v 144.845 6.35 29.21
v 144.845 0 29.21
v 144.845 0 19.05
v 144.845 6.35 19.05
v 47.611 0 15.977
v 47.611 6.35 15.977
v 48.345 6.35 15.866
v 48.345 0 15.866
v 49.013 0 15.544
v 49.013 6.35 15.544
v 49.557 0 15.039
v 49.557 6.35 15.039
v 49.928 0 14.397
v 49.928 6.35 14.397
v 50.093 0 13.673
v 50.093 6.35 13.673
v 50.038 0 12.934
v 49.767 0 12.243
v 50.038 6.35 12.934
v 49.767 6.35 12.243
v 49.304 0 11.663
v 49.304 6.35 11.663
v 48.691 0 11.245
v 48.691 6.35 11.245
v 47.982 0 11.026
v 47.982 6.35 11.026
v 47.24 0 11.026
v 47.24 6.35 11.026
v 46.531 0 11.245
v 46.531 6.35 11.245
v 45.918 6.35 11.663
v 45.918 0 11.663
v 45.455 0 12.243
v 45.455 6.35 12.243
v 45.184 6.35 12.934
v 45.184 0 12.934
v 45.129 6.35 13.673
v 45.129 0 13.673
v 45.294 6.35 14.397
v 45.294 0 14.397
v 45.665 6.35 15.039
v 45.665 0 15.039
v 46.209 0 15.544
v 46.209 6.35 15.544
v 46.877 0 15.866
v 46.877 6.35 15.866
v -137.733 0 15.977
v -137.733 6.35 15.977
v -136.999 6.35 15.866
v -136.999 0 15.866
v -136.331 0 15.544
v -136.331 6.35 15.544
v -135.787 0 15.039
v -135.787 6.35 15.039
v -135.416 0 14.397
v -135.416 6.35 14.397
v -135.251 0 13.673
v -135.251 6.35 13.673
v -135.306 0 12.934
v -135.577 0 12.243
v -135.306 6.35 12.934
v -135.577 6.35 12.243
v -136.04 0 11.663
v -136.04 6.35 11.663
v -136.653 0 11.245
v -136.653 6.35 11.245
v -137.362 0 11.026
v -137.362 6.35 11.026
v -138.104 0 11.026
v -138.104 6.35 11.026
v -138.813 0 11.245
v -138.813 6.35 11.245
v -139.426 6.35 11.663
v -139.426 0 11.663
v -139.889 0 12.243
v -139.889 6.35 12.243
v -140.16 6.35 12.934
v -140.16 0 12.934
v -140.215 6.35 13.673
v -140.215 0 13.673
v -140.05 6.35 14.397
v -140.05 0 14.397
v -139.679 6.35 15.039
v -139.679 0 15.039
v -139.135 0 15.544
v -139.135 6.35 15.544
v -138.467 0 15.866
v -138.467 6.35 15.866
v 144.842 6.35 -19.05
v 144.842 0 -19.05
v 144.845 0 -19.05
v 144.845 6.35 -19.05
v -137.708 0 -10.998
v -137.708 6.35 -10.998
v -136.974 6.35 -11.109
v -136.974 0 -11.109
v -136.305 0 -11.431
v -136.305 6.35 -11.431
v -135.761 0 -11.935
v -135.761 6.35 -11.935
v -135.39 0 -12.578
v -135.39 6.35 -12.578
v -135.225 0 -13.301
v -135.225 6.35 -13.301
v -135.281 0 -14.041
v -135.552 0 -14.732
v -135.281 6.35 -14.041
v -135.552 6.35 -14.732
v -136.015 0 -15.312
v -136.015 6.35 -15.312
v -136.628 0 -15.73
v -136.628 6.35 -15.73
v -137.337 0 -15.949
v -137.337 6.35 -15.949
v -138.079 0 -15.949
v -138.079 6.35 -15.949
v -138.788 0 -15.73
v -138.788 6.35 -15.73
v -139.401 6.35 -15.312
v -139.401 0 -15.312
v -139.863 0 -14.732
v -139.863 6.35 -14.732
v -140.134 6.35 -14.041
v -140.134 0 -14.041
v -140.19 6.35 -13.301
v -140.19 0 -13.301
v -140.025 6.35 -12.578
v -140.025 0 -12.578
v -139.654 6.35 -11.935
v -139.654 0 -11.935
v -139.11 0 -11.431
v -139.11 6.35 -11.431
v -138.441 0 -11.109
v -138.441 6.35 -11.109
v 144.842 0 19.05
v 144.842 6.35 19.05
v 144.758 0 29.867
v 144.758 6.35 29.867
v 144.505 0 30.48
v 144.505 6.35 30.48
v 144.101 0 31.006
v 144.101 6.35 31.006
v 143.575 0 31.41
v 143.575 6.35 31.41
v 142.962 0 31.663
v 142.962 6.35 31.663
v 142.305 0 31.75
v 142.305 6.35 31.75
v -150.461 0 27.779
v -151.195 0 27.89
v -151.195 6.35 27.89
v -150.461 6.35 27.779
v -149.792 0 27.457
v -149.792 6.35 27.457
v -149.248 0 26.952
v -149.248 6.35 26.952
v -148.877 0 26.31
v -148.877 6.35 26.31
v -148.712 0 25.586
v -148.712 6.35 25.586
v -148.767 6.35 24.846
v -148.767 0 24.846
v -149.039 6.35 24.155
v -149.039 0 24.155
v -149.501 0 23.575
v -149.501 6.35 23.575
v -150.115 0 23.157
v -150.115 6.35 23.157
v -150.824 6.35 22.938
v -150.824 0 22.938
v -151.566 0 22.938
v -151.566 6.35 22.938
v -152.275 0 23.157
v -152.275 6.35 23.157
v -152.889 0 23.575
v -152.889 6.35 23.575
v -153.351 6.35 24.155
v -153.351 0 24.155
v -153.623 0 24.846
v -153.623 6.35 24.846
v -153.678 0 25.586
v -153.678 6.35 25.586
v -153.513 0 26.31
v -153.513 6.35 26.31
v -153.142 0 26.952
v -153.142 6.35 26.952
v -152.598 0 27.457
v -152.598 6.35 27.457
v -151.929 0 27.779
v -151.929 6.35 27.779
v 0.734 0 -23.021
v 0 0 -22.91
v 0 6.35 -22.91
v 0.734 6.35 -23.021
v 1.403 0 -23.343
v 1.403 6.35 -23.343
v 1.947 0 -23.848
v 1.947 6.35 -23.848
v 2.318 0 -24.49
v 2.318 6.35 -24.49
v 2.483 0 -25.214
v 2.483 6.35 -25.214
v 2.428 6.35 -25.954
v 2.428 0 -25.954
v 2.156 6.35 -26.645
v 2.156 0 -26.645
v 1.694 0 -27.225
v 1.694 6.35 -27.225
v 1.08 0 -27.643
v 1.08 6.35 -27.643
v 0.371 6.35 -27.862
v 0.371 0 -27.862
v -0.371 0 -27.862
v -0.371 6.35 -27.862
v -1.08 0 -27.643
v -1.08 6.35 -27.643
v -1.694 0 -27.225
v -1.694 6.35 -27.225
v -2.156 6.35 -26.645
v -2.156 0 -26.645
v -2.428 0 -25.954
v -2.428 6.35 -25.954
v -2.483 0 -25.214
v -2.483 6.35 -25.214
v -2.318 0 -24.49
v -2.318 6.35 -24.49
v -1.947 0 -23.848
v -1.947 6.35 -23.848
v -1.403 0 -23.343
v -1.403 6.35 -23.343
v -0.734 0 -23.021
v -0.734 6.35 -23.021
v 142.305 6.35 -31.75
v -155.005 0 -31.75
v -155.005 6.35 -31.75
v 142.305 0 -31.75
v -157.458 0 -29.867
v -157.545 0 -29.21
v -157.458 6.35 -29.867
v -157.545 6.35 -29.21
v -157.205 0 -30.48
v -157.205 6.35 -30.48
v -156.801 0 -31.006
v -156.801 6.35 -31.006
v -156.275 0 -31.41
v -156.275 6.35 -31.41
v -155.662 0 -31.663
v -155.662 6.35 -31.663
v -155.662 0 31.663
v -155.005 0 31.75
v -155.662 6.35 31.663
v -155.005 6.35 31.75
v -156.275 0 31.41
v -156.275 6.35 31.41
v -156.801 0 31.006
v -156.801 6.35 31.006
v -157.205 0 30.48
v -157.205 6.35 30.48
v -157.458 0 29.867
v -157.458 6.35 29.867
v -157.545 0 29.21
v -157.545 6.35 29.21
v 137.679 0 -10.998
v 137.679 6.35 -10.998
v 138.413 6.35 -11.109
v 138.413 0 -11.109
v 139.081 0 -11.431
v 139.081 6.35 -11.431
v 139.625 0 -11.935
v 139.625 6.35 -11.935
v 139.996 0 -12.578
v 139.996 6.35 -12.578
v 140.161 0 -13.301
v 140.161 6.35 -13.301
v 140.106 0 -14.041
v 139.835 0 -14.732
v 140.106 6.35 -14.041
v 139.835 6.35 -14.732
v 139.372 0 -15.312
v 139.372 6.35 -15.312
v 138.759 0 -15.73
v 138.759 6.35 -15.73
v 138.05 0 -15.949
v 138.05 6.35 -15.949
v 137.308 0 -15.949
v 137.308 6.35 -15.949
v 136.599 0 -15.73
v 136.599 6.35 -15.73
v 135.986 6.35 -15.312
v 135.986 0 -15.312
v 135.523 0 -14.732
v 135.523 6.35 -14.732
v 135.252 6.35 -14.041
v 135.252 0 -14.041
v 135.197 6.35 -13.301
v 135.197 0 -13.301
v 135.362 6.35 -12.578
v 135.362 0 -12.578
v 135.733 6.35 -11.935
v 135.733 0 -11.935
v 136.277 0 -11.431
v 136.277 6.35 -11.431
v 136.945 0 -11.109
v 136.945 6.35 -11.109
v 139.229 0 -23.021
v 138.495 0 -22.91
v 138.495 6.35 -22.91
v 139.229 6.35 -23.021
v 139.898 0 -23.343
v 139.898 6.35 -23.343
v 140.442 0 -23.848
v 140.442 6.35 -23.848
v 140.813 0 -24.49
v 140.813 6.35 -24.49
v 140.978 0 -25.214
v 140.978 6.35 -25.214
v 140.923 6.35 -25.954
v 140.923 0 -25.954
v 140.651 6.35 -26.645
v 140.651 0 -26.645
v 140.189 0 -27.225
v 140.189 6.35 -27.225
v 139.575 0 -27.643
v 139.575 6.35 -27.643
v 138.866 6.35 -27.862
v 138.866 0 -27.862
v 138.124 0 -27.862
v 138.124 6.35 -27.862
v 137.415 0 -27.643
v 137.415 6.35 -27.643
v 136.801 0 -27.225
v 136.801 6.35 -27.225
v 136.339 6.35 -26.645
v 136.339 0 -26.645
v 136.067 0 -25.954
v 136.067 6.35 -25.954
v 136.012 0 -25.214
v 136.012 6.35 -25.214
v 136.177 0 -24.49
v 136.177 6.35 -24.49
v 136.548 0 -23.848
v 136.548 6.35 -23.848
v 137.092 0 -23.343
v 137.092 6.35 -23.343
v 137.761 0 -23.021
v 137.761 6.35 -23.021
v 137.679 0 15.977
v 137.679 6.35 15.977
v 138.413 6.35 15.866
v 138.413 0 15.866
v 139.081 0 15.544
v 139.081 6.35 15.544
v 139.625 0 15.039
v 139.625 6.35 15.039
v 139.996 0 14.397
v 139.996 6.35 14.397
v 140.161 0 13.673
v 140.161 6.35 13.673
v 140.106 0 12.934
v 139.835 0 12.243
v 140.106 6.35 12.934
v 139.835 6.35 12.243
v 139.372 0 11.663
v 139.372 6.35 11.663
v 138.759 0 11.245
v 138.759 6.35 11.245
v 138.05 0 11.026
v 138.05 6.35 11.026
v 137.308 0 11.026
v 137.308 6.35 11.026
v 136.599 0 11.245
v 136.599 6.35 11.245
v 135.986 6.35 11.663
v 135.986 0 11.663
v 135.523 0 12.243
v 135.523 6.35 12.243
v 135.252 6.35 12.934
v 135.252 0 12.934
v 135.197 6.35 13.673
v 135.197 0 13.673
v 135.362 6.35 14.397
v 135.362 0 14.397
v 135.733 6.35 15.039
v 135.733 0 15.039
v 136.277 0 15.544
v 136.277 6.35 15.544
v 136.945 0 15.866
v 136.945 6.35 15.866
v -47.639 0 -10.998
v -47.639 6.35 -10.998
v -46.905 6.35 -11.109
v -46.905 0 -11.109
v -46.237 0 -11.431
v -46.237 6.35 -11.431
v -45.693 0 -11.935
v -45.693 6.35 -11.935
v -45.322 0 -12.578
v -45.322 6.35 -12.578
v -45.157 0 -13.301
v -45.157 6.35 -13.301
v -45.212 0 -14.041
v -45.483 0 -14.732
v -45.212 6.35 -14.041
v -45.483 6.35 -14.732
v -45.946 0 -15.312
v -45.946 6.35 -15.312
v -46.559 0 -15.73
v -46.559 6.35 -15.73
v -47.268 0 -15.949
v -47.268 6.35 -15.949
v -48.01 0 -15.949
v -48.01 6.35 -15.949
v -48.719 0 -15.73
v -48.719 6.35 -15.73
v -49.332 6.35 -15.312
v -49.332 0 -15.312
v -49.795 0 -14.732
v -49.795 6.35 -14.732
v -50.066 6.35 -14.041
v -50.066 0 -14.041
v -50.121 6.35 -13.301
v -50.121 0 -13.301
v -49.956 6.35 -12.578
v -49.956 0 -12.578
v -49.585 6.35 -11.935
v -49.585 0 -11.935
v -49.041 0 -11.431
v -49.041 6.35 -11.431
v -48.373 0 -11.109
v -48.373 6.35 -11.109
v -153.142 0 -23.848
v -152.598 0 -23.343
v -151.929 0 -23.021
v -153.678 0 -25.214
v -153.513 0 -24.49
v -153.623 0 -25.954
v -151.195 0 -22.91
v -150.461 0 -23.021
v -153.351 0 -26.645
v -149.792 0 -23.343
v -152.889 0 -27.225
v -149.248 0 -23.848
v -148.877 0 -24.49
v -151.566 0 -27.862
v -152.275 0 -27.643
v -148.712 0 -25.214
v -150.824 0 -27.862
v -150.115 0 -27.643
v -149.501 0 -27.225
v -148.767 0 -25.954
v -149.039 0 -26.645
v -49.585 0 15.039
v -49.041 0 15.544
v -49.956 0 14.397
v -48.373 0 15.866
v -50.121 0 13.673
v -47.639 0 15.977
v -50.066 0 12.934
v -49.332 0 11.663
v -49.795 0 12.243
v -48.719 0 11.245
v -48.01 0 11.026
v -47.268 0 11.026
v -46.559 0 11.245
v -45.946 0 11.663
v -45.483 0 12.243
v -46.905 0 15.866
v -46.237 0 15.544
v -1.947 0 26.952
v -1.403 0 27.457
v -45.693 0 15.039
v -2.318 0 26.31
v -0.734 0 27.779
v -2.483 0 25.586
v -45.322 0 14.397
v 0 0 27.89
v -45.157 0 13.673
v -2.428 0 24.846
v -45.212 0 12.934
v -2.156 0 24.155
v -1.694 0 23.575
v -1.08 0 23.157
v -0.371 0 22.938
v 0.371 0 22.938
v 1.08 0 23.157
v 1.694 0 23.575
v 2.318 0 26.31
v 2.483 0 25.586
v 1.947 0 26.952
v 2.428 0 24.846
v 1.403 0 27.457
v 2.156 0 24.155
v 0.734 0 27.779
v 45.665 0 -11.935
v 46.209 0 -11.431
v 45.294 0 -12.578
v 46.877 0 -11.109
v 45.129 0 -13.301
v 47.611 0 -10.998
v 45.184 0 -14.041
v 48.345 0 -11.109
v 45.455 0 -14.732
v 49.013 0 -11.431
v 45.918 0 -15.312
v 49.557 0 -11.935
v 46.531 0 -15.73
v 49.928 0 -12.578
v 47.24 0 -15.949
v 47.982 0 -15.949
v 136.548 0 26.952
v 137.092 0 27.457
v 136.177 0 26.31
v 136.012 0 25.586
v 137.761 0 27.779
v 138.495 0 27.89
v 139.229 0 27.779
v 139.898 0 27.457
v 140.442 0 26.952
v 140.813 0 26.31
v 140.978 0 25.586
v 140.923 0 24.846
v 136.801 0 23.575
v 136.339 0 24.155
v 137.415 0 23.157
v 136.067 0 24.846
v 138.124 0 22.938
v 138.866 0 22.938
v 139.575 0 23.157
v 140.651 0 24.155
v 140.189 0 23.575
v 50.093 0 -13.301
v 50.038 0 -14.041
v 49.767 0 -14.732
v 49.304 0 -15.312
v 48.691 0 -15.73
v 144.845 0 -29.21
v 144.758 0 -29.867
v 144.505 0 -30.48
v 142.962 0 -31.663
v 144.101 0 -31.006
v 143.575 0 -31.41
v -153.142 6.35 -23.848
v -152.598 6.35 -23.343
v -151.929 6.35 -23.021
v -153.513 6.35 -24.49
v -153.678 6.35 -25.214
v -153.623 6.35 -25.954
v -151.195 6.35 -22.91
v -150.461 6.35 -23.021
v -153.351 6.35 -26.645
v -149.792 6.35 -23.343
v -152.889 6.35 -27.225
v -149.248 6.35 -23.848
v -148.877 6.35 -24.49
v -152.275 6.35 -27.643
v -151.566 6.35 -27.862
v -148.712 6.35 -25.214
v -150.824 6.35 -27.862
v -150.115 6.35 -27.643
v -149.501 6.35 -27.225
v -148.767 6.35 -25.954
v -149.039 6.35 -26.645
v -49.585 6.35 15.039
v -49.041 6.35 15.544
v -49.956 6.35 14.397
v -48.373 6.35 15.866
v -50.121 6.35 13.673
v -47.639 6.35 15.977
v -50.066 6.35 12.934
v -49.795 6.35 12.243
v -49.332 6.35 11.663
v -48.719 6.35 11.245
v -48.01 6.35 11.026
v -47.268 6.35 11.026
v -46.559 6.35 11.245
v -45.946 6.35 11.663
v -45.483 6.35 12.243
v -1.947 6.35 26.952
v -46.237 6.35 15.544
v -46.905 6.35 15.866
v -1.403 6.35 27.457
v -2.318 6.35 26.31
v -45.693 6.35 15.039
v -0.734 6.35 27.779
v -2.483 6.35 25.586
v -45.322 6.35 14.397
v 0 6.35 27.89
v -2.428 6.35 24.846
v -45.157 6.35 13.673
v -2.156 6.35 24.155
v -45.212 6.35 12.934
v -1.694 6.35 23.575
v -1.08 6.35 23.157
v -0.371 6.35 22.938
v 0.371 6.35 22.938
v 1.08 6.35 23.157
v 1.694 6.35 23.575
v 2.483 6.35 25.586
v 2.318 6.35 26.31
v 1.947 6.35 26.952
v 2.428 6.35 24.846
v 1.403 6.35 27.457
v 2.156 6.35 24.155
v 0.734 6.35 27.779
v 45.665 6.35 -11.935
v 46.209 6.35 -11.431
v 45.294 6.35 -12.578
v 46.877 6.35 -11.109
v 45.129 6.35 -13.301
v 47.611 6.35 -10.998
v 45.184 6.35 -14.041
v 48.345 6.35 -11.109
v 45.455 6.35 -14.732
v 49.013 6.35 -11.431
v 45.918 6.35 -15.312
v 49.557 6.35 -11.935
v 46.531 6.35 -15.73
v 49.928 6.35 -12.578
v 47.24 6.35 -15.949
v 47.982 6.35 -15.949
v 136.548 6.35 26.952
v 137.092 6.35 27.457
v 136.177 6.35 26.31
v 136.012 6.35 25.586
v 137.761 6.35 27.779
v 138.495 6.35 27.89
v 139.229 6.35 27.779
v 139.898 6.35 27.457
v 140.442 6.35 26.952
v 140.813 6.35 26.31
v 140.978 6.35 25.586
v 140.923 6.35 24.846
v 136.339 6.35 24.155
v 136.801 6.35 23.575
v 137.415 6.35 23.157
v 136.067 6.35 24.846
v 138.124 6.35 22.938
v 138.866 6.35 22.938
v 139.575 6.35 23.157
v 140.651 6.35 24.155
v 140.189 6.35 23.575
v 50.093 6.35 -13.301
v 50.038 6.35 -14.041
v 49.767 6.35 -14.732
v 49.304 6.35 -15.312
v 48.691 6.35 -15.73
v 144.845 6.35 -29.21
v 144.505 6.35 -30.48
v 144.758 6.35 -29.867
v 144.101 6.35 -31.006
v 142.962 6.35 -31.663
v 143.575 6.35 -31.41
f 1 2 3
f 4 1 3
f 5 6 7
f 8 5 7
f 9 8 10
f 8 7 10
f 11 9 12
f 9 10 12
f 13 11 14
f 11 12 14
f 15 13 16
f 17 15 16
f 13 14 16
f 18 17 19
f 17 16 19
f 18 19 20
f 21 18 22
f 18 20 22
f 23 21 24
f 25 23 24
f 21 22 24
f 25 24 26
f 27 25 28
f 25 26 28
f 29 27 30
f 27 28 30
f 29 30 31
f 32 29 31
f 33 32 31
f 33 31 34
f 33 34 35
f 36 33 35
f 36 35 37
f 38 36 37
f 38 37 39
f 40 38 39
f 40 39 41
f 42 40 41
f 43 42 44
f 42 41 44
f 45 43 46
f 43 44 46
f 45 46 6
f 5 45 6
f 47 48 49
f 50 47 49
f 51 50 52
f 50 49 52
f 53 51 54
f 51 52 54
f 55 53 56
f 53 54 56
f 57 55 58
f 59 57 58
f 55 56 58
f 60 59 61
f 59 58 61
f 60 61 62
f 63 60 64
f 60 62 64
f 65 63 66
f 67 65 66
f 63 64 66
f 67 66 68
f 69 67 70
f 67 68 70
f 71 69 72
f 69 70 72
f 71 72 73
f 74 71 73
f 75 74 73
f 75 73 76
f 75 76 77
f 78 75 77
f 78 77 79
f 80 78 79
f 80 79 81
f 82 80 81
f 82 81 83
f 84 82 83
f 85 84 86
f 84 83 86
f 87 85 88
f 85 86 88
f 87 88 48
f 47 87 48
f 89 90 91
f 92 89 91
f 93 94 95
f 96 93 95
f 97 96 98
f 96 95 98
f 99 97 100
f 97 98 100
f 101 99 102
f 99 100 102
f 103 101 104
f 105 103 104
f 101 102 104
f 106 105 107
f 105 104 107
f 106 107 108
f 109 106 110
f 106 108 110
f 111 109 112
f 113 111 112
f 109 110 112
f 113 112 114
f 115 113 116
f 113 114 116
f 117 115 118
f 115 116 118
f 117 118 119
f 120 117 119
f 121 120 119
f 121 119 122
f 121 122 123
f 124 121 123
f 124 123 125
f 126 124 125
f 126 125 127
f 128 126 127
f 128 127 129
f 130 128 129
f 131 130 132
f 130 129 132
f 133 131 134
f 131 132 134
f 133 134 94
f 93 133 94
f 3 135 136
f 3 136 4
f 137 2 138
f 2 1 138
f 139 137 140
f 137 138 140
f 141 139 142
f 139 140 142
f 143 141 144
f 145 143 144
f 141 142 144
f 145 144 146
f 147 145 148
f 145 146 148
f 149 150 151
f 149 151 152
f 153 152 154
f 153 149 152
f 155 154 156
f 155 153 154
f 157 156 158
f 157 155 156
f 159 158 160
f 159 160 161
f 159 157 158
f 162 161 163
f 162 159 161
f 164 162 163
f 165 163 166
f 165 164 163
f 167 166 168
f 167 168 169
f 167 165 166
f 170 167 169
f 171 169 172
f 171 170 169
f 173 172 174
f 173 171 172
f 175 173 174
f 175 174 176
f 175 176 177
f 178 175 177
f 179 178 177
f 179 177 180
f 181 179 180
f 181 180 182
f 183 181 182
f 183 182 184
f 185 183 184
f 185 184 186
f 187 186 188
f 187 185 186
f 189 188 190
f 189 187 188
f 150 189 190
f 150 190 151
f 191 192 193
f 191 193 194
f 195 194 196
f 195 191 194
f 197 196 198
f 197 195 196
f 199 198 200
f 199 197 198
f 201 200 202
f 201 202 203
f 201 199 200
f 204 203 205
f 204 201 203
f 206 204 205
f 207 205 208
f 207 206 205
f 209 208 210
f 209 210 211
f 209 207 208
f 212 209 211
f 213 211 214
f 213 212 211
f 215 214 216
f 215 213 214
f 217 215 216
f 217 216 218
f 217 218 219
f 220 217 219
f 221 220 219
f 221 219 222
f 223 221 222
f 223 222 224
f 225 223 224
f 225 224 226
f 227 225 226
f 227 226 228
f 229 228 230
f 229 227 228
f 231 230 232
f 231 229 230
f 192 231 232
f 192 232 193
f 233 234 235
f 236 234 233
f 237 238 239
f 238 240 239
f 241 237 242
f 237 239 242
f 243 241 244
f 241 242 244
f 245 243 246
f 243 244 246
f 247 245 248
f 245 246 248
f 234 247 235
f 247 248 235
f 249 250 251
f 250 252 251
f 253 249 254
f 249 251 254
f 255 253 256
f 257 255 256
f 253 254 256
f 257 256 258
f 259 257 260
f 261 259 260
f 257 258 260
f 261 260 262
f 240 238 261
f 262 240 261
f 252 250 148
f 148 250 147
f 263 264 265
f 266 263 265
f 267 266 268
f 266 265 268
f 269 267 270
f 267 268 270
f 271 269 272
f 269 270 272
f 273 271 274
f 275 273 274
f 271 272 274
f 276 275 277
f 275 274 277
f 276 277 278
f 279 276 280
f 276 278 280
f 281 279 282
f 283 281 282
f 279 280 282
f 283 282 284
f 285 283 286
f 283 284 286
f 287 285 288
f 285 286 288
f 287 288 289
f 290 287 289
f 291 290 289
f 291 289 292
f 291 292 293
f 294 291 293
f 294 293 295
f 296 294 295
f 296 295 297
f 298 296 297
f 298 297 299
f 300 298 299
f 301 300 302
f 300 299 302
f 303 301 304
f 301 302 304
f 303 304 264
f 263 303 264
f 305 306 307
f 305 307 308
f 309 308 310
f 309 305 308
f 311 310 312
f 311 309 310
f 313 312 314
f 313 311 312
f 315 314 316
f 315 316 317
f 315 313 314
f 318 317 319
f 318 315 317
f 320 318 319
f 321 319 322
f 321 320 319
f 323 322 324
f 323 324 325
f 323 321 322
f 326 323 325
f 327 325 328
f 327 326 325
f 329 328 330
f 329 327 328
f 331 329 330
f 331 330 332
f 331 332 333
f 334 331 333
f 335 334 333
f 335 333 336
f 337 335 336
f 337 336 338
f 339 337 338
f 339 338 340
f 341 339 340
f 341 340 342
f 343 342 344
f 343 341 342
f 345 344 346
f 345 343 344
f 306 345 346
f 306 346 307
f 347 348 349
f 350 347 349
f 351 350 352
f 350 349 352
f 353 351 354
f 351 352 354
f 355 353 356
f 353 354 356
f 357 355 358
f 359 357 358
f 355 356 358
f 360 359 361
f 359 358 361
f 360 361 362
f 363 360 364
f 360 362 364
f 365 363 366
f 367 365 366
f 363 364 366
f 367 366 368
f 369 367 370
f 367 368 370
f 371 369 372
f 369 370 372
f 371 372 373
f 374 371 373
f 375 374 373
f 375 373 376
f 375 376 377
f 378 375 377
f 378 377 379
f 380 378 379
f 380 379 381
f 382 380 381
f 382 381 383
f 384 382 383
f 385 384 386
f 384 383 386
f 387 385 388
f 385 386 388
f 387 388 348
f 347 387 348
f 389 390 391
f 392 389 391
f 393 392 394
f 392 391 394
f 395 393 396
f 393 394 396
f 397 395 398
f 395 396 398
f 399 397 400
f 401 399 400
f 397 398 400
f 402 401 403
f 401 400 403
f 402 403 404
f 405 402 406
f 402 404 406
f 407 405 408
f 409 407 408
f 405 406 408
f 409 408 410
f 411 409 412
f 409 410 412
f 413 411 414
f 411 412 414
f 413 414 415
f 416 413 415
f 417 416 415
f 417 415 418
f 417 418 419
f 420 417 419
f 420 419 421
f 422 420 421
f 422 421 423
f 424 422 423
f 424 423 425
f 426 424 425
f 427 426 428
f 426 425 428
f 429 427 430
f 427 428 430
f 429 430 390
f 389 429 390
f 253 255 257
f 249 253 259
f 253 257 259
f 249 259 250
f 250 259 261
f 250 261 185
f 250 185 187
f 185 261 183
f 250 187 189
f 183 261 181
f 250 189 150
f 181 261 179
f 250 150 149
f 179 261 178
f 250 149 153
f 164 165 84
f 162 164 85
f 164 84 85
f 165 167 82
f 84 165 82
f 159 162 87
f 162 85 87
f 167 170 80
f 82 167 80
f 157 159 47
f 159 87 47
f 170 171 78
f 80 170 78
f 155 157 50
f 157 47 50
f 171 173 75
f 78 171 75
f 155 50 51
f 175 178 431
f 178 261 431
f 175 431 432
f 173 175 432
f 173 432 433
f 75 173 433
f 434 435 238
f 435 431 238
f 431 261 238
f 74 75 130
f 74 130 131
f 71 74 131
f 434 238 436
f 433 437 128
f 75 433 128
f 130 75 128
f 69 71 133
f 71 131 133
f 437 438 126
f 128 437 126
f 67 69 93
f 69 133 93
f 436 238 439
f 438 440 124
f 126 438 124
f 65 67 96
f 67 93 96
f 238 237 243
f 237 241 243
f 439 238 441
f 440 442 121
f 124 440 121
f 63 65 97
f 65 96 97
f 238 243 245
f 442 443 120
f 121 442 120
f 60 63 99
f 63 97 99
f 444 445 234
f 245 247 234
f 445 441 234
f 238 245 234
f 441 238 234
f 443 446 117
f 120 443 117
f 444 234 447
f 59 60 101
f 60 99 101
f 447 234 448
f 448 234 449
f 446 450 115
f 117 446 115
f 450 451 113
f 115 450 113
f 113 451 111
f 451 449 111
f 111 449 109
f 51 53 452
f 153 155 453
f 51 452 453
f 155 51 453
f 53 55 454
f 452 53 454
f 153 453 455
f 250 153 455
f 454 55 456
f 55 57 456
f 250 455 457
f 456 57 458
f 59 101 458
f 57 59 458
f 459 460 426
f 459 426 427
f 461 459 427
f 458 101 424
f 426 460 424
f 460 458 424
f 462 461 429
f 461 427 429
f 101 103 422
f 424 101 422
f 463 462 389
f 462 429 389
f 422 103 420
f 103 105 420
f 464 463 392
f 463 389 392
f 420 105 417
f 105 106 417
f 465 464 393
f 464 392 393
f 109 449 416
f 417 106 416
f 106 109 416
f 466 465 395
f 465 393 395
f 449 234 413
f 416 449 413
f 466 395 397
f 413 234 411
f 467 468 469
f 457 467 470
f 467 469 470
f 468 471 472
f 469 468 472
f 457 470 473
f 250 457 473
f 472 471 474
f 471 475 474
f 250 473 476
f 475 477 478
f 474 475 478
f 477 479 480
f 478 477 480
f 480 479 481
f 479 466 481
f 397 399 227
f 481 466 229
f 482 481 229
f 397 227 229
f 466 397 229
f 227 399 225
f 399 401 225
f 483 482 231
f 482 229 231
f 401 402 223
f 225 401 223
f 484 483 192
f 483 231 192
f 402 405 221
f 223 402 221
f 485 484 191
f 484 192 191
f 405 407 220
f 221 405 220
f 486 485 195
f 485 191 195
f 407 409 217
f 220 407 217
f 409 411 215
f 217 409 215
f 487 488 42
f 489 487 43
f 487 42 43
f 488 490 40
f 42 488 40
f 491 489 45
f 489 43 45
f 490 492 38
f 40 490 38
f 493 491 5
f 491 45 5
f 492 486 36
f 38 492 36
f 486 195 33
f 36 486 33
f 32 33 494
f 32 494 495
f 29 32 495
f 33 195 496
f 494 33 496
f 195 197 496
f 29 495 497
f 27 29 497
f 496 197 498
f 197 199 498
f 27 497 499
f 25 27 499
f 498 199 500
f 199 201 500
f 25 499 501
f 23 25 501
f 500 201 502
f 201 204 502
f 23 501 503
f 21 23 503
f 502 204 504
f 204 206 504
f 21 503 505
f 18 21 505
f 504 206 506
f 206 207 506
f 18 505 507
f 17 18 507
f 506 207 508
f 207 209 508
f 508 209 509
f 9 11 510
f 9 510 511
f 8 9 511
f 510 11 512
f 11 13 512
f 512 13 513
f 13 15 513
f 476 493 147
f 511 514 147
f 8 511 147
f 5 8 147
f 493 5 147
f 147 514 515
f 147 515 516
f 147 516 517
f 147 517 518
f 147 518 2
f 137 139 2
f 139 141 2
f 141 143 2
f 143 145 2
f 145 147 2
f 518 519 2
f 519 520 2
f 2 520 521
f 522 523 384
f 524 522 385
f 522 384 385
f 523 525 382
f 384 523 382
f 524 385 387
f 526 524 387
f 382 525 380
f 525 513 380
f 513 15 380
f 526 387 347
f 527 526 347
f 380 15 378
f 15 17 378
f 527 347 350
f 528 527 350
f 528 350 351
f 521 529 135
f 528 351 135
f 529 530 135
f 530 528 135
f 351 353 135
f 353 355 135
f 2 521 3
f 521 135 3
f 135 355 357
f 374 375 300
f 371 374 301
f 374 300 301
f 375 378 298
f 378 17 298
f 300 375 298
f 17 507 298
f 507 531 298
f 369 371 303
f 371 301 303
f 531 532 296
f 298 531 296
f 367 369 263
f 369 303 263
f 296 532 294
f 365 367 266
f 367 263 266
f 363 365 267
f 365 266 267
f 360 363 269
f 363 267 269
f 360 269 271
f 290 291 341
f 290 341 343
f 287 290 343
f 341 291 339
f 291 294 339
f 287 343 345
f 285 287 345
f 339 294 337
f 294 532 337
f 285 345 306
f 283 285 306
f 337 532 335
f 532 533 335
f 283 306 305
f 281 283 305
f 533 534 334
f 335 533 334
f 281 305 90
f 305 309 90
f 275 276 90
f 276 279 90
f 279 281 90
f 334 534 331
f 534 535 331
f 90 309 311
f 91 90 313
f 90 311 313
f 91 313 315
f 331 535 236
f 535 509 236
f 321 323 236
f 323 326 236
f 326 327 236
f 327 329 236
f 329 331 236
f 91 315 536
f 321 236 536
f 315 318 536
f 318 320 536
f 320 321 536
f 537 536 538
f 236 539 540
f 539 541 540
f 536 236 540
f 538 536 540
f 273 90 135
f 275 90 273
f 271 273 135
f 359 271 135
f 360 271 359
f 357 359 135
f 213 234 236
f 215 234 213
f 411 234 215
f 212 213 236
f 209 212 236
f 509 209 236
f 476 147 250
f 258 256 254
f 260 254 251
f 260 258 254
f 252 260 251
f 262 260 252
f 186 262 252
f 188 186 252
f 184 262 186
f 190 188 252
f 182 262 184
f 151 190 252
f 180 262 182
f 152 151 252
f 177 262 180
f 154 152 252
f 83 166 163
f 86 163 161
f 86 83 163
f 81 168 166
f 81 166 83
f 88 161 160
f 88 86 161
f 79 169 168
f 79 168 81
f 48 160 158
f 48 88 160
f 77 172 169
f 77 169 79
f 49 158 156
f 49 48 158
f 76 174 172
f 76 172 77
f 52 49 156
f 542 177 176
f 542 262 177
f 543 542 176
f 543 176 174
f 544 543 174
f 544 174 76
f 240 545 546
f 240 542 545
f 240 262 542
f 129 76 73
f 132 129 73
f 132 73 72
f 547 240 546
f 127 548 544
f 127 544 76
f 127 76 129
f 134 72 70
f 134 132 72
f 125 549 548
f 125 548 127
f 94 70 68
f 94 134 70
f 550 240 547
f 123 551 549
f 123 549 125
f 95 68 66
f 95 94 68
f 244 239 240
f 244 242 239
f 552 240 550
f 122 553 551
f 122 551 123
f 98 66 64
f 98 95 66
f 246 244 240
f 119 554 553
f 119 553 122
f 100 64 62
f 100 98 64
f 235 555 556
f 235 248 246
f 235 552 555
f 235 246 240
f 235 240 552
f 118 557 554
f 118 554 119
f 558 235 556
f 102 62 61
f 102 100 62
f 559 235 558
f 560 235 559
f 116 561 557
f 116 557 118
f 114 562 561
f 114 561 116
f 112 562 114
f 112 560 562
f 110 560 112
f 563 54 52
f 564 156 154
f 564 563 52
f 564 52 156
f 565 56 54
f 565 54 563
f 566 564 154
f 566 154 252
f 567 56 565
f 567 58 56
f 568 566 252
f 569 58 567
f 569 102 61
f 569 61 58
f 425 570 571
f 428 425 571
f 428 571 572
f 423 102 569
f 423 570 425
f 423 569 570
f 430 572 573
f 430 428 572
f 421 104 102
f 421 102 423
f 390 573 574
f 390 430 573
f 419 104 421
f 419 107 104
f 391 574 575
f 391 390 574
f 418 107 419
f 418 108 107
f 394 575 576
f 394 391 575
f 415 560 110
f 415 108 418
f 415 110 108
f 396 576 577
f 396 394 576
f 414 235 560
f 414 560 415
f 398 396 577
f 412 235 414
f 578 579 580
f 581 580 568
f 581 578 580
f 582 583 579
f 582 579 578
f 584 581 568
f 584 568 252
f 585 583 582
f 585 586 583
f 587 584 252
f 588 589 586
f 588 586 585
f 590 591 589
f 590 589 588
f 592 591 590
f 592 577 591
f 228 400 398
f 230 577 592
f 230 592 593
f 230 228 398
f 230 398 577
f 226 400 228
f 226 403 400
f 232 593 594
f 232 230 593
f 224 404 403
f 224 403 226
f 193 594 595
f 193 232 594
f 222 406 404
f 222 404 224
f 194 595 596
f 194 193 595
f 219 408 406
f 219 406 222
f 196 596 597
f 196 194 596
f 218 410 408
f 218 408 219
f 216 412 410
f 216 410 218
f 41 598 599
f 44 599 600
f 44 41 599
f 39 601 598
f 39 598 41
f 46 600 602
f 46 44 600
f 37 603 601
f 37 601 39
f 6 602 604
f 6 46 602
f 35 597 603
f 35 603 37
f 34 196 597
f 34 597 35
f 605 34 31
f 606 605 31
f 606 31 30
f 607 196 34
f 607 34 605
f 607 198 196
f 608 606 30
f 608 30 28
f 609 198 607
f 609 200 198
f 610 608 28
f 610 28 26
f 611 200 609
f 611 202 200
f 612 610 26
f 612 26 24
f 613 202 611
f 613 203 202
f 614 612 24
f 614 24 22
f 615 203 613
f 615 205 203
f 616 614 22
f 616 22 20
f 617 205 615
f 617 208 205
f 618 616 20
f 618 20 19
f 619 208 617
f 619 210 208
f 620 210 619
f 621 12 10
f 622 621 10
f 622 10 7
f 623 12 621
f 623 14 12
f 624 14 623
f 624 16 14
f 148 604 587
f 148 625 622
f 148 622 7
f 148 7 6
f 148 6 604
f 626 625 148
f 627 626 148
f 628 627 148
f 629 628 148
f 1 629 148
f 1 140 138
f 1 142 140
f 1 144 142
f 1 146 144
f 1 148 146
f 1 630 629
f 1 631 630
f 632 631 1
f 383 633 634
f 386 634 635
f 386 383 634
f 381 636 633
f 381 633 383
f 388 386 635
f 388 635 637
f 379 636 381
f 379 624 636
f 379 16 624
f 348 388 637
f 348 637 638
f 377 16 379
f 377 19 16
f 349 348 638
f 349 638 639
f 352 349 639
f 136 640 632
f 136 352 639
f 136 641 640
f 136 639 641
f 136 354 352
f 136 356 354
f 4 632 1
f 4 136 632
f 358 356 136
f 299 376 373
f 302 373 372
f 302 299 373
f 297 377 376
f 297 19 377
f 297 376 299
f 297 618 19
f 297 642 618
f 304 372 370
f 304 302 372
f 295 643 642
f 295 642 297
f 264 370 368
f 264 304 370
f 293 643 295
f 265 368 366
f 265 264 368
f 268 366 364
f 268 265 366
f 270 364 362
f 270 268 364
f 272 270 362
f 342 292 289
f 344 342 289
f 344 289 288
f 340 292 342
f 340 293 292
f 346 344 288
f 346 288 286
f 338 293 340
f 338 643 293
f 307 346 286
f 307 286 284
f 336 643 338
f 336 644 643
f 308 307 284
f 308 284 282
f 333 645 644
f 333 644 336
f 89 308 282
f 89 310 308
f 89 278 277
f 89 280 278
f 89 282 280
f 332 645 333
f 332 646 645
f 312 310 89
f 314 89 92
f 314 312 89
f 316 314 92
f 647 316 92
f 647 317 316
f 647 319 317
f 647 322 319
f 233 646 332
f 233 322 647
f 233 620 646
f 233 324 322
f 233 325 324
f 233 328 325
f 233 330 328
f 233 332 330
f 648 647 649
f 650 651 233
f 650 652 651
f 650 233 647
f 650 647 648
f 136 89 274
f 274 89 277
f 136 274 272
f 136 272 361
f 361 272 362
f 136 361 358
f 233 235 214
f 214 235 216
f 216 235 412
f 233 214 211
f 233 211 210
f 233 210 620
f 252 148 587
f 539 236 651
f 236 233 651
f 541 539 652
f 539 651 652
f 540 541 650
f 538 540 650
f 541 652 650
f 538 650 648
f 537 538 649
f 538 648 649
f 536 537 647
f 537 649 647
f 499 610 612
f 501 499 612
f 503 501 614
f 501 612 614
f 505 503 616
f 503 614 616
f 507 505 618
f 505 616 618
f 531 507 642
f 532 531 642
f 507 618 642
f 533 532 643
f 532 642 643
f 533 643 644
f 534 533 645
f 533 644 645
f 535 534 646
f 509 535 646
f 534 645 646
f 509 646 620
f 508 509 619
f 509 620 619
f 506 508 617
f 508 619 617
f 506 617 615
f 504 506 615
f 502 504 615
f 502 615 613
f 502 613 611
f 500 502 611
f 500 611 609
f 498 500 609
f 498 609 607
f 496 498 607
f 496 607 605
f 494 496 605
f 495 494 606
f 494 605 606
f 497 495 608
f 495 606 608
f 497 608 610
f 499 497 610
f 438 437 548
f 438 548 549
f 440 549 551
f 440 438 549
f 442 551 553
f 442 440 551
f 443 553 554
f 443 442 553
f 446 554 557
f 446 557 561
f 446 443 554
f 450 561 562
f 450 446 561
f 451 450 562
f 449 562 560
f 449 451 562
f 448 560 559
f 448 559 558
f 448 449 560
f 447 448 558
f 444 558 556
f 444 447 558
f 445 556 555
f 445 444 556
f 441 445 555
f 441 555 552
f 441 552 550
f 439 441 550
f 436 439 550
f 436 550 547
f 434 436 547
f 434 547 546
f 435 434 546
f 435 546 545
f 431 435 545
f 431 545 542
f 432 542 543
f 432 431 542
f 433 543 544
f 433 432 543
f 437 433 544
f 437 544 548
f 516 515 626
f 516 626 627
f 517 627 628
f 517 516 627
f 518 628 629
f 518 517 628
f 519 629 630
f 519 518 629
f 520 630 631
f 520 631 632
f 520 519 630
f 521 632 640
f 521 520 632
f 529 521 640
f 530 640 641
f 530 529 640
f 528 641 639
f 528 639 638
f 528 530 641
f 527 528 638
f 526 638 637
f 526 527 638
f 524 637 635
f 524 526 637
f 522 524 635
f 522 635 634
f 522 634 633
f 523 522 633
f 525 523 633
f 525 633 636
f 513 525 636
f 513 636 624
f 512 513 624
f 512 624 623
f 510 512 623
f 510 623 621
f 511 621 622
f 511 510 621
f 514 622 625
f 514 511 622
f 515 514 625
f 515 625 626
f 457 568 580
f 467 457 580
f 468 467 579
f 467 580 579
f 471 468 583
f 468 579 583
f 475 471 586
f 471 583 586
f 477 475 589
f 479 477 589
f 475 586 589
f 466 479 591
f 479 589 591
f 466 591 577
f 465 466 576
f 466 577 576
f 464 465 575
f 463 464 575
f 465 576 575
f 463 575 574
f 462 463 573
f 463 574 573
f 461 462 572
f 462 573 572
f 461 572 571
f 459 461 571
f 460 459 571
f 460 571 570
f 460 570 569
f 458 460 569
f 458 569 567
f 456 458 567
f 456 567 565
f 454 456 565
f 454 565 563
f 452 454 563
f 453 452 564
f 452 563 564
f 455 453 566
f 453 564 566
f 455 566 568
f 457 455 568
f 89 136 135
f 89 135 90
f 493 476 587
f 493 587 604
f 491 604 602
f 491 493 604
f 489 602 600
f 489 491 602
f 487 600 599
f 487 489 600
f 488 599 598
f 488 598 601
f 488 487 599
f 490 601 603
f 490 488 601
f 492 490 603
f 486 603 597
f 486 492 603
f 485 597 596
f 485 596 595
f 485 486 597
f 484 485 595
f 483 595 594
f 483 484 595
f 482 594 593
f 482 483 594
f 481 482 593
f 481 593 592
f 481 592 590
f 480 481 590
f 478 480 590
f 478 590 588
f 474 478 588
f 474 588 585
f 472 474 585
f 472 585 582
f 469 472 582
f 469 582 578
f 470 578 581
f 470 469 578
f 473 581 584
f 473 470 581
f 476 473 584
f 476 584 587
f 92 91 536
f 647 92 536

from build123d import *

# Parameters (mm, degrees)
SKETCH1_W           = 289.69
SKETCH1_H           = 12.7
SKETCH1_R           = 2.49
BOSS_EXTRUDE1_DEPTH = 6.35
FILLET1_R           = 2.54
SKETCH3_W           = 289.687
SKETCH3_H           = 38.1
SKETCH3_R           = 2.4892
BOSS_EXTRUDE2_DEPTH = 6.35


with BuildPart() as part:
    # Sketch1 → Boss-Extrude1 (new body)
    # profile 1 of 3: a face of its own
    with BuildSketch(Plane(origin=(0, 0, 0), x_dir=(1, 0, 0), z_dir=(0, 1, 0))):
        with Locations((0, -25.4)):
            Rectangle(SKETCH1_W, SKETCH1_H)
        with Locations(Location((138.495, -25.4, 0), (0, 0, 270))):
            Circle(SKETCH1_R, mode=Mode.SUBTRACT)
        with Locations(Location((0, -25.4, 0), (0, 0, 270))):
            Circle(SKETCH1_R, mode=Mode.SUBTRACT)
    # profile 2 of 3: a face of its own
    with BuildSketch(Plane(origin=(0, 0, 0), x_dir=(1, 0, 0), z_dir=(0, 1, 0))):
        Polygon((-144.845, 31.75), (-157.545, 31.75), (-157.545, -31.75), (-144.845, -31.75), (-144.845, -19.05), (-144.845, 19.05), align=None)
        with Locations(Location((-151.195, -25.4, 0), (0, 0, 270))):
            Circle(SKETCH1_R, mode=Mode.SUBTRACT)
        with Locations(Location((-151.195, 25.4, 0), (0, 0, 270))):
            Circle(SKETCH1_R, mode=Mode.SUBTRACT)
    # profile 3 of 3: a face of its own
    with BuildSketch(Plane(origin=(0, 0, 0), x_dir=(1, 0, 0), z_dir=(0, 1, 0))):
        with Locations((0, 25.4)):
            Rectangle(SKETCH1_W, SKETCH1_H)
        with Locations(Location((138.495, 25.4, 0), (0, 0, 270))):
            Circle(SKETCH1_R, mode=Mode.SUBTRACT)
        with Locations(Location((0, 25.4, 0), (0, 0, 270))):
            Circle(SKETCH1_R, mode=Mode.SUBTRACT)
    extrude(amount=BOSS_EXTRUDE1_DEPTH)

    # Fillet1
    fillet1_edges = [part.edges().sort_by_distance(p)[0] for p in [
        (144.845, 3.175, 31.75),
        (-157.545, 3.175, 31.75),
        (-157.545, 3.175, -31.75),
        (144.845, 3.175, -31.75),
    ]]
    fillet(fillet1_edges, radius=FILLET1_R)

    # Sketch3 → Boss-Extrude2 (add)
    with BuildSketch(Plane(origin=(0, 6.35, 0), x_dir=(1, 0, 0), z_dir=(0, 1, 0))):
        with Locations((-0.0015, 0)):
            Rectangle(SKETCH3_W, SKETCH3_H)
        with Locations(Location((-137.7076, 13.4874, 0), (0, 0, 270))):
            Circle(SKETCH3_R, mode=Mode.SUBTRACT)
        with Locations(Location((-137.733, -13.4874, 0), (0, 0, 270))):
            Circle(SKETCH3_R, mode=Mode.SUBTRACT)
        with Locations(Location((-47.6392, -13.4874, 0), (0, 0, 270))):
            Circle(SKETCH3_R, mode=Mode.SUBTRACT)
        with Locations(Location((-47.6392, 13.4874, 0), (0, 0, 270))):
            Circle(SKETCH3_R, mode=Mode.SUBTRACT)
        with Locations(Location((47.6108, 13.4874, 0), (0, 0, 270))):
            Circle(SKETCH3_R, mode=Mode.SUBTRACT)
        with Locations(Location((47.6108, -13.4874, 0), (0, 0, 270))):
            Circle(SKETCH3_R, mode=Mode.SUBTRACT)
        with Locations(Location((137.6792, 13.4874, 0), (0, 0, 270))):
            Circle(SKETCH3_R, mode=Mode.SUBTRACT)
        with Locations(Location((137.6792, -13.4874, 0), (0, 0, 270))):
            Circle(SKETCH3_R, mode=Mode.SUBTRACT)
    extrude(amount=-BOSS_EXTRUDE2_DEPTH)


solid = part.part
